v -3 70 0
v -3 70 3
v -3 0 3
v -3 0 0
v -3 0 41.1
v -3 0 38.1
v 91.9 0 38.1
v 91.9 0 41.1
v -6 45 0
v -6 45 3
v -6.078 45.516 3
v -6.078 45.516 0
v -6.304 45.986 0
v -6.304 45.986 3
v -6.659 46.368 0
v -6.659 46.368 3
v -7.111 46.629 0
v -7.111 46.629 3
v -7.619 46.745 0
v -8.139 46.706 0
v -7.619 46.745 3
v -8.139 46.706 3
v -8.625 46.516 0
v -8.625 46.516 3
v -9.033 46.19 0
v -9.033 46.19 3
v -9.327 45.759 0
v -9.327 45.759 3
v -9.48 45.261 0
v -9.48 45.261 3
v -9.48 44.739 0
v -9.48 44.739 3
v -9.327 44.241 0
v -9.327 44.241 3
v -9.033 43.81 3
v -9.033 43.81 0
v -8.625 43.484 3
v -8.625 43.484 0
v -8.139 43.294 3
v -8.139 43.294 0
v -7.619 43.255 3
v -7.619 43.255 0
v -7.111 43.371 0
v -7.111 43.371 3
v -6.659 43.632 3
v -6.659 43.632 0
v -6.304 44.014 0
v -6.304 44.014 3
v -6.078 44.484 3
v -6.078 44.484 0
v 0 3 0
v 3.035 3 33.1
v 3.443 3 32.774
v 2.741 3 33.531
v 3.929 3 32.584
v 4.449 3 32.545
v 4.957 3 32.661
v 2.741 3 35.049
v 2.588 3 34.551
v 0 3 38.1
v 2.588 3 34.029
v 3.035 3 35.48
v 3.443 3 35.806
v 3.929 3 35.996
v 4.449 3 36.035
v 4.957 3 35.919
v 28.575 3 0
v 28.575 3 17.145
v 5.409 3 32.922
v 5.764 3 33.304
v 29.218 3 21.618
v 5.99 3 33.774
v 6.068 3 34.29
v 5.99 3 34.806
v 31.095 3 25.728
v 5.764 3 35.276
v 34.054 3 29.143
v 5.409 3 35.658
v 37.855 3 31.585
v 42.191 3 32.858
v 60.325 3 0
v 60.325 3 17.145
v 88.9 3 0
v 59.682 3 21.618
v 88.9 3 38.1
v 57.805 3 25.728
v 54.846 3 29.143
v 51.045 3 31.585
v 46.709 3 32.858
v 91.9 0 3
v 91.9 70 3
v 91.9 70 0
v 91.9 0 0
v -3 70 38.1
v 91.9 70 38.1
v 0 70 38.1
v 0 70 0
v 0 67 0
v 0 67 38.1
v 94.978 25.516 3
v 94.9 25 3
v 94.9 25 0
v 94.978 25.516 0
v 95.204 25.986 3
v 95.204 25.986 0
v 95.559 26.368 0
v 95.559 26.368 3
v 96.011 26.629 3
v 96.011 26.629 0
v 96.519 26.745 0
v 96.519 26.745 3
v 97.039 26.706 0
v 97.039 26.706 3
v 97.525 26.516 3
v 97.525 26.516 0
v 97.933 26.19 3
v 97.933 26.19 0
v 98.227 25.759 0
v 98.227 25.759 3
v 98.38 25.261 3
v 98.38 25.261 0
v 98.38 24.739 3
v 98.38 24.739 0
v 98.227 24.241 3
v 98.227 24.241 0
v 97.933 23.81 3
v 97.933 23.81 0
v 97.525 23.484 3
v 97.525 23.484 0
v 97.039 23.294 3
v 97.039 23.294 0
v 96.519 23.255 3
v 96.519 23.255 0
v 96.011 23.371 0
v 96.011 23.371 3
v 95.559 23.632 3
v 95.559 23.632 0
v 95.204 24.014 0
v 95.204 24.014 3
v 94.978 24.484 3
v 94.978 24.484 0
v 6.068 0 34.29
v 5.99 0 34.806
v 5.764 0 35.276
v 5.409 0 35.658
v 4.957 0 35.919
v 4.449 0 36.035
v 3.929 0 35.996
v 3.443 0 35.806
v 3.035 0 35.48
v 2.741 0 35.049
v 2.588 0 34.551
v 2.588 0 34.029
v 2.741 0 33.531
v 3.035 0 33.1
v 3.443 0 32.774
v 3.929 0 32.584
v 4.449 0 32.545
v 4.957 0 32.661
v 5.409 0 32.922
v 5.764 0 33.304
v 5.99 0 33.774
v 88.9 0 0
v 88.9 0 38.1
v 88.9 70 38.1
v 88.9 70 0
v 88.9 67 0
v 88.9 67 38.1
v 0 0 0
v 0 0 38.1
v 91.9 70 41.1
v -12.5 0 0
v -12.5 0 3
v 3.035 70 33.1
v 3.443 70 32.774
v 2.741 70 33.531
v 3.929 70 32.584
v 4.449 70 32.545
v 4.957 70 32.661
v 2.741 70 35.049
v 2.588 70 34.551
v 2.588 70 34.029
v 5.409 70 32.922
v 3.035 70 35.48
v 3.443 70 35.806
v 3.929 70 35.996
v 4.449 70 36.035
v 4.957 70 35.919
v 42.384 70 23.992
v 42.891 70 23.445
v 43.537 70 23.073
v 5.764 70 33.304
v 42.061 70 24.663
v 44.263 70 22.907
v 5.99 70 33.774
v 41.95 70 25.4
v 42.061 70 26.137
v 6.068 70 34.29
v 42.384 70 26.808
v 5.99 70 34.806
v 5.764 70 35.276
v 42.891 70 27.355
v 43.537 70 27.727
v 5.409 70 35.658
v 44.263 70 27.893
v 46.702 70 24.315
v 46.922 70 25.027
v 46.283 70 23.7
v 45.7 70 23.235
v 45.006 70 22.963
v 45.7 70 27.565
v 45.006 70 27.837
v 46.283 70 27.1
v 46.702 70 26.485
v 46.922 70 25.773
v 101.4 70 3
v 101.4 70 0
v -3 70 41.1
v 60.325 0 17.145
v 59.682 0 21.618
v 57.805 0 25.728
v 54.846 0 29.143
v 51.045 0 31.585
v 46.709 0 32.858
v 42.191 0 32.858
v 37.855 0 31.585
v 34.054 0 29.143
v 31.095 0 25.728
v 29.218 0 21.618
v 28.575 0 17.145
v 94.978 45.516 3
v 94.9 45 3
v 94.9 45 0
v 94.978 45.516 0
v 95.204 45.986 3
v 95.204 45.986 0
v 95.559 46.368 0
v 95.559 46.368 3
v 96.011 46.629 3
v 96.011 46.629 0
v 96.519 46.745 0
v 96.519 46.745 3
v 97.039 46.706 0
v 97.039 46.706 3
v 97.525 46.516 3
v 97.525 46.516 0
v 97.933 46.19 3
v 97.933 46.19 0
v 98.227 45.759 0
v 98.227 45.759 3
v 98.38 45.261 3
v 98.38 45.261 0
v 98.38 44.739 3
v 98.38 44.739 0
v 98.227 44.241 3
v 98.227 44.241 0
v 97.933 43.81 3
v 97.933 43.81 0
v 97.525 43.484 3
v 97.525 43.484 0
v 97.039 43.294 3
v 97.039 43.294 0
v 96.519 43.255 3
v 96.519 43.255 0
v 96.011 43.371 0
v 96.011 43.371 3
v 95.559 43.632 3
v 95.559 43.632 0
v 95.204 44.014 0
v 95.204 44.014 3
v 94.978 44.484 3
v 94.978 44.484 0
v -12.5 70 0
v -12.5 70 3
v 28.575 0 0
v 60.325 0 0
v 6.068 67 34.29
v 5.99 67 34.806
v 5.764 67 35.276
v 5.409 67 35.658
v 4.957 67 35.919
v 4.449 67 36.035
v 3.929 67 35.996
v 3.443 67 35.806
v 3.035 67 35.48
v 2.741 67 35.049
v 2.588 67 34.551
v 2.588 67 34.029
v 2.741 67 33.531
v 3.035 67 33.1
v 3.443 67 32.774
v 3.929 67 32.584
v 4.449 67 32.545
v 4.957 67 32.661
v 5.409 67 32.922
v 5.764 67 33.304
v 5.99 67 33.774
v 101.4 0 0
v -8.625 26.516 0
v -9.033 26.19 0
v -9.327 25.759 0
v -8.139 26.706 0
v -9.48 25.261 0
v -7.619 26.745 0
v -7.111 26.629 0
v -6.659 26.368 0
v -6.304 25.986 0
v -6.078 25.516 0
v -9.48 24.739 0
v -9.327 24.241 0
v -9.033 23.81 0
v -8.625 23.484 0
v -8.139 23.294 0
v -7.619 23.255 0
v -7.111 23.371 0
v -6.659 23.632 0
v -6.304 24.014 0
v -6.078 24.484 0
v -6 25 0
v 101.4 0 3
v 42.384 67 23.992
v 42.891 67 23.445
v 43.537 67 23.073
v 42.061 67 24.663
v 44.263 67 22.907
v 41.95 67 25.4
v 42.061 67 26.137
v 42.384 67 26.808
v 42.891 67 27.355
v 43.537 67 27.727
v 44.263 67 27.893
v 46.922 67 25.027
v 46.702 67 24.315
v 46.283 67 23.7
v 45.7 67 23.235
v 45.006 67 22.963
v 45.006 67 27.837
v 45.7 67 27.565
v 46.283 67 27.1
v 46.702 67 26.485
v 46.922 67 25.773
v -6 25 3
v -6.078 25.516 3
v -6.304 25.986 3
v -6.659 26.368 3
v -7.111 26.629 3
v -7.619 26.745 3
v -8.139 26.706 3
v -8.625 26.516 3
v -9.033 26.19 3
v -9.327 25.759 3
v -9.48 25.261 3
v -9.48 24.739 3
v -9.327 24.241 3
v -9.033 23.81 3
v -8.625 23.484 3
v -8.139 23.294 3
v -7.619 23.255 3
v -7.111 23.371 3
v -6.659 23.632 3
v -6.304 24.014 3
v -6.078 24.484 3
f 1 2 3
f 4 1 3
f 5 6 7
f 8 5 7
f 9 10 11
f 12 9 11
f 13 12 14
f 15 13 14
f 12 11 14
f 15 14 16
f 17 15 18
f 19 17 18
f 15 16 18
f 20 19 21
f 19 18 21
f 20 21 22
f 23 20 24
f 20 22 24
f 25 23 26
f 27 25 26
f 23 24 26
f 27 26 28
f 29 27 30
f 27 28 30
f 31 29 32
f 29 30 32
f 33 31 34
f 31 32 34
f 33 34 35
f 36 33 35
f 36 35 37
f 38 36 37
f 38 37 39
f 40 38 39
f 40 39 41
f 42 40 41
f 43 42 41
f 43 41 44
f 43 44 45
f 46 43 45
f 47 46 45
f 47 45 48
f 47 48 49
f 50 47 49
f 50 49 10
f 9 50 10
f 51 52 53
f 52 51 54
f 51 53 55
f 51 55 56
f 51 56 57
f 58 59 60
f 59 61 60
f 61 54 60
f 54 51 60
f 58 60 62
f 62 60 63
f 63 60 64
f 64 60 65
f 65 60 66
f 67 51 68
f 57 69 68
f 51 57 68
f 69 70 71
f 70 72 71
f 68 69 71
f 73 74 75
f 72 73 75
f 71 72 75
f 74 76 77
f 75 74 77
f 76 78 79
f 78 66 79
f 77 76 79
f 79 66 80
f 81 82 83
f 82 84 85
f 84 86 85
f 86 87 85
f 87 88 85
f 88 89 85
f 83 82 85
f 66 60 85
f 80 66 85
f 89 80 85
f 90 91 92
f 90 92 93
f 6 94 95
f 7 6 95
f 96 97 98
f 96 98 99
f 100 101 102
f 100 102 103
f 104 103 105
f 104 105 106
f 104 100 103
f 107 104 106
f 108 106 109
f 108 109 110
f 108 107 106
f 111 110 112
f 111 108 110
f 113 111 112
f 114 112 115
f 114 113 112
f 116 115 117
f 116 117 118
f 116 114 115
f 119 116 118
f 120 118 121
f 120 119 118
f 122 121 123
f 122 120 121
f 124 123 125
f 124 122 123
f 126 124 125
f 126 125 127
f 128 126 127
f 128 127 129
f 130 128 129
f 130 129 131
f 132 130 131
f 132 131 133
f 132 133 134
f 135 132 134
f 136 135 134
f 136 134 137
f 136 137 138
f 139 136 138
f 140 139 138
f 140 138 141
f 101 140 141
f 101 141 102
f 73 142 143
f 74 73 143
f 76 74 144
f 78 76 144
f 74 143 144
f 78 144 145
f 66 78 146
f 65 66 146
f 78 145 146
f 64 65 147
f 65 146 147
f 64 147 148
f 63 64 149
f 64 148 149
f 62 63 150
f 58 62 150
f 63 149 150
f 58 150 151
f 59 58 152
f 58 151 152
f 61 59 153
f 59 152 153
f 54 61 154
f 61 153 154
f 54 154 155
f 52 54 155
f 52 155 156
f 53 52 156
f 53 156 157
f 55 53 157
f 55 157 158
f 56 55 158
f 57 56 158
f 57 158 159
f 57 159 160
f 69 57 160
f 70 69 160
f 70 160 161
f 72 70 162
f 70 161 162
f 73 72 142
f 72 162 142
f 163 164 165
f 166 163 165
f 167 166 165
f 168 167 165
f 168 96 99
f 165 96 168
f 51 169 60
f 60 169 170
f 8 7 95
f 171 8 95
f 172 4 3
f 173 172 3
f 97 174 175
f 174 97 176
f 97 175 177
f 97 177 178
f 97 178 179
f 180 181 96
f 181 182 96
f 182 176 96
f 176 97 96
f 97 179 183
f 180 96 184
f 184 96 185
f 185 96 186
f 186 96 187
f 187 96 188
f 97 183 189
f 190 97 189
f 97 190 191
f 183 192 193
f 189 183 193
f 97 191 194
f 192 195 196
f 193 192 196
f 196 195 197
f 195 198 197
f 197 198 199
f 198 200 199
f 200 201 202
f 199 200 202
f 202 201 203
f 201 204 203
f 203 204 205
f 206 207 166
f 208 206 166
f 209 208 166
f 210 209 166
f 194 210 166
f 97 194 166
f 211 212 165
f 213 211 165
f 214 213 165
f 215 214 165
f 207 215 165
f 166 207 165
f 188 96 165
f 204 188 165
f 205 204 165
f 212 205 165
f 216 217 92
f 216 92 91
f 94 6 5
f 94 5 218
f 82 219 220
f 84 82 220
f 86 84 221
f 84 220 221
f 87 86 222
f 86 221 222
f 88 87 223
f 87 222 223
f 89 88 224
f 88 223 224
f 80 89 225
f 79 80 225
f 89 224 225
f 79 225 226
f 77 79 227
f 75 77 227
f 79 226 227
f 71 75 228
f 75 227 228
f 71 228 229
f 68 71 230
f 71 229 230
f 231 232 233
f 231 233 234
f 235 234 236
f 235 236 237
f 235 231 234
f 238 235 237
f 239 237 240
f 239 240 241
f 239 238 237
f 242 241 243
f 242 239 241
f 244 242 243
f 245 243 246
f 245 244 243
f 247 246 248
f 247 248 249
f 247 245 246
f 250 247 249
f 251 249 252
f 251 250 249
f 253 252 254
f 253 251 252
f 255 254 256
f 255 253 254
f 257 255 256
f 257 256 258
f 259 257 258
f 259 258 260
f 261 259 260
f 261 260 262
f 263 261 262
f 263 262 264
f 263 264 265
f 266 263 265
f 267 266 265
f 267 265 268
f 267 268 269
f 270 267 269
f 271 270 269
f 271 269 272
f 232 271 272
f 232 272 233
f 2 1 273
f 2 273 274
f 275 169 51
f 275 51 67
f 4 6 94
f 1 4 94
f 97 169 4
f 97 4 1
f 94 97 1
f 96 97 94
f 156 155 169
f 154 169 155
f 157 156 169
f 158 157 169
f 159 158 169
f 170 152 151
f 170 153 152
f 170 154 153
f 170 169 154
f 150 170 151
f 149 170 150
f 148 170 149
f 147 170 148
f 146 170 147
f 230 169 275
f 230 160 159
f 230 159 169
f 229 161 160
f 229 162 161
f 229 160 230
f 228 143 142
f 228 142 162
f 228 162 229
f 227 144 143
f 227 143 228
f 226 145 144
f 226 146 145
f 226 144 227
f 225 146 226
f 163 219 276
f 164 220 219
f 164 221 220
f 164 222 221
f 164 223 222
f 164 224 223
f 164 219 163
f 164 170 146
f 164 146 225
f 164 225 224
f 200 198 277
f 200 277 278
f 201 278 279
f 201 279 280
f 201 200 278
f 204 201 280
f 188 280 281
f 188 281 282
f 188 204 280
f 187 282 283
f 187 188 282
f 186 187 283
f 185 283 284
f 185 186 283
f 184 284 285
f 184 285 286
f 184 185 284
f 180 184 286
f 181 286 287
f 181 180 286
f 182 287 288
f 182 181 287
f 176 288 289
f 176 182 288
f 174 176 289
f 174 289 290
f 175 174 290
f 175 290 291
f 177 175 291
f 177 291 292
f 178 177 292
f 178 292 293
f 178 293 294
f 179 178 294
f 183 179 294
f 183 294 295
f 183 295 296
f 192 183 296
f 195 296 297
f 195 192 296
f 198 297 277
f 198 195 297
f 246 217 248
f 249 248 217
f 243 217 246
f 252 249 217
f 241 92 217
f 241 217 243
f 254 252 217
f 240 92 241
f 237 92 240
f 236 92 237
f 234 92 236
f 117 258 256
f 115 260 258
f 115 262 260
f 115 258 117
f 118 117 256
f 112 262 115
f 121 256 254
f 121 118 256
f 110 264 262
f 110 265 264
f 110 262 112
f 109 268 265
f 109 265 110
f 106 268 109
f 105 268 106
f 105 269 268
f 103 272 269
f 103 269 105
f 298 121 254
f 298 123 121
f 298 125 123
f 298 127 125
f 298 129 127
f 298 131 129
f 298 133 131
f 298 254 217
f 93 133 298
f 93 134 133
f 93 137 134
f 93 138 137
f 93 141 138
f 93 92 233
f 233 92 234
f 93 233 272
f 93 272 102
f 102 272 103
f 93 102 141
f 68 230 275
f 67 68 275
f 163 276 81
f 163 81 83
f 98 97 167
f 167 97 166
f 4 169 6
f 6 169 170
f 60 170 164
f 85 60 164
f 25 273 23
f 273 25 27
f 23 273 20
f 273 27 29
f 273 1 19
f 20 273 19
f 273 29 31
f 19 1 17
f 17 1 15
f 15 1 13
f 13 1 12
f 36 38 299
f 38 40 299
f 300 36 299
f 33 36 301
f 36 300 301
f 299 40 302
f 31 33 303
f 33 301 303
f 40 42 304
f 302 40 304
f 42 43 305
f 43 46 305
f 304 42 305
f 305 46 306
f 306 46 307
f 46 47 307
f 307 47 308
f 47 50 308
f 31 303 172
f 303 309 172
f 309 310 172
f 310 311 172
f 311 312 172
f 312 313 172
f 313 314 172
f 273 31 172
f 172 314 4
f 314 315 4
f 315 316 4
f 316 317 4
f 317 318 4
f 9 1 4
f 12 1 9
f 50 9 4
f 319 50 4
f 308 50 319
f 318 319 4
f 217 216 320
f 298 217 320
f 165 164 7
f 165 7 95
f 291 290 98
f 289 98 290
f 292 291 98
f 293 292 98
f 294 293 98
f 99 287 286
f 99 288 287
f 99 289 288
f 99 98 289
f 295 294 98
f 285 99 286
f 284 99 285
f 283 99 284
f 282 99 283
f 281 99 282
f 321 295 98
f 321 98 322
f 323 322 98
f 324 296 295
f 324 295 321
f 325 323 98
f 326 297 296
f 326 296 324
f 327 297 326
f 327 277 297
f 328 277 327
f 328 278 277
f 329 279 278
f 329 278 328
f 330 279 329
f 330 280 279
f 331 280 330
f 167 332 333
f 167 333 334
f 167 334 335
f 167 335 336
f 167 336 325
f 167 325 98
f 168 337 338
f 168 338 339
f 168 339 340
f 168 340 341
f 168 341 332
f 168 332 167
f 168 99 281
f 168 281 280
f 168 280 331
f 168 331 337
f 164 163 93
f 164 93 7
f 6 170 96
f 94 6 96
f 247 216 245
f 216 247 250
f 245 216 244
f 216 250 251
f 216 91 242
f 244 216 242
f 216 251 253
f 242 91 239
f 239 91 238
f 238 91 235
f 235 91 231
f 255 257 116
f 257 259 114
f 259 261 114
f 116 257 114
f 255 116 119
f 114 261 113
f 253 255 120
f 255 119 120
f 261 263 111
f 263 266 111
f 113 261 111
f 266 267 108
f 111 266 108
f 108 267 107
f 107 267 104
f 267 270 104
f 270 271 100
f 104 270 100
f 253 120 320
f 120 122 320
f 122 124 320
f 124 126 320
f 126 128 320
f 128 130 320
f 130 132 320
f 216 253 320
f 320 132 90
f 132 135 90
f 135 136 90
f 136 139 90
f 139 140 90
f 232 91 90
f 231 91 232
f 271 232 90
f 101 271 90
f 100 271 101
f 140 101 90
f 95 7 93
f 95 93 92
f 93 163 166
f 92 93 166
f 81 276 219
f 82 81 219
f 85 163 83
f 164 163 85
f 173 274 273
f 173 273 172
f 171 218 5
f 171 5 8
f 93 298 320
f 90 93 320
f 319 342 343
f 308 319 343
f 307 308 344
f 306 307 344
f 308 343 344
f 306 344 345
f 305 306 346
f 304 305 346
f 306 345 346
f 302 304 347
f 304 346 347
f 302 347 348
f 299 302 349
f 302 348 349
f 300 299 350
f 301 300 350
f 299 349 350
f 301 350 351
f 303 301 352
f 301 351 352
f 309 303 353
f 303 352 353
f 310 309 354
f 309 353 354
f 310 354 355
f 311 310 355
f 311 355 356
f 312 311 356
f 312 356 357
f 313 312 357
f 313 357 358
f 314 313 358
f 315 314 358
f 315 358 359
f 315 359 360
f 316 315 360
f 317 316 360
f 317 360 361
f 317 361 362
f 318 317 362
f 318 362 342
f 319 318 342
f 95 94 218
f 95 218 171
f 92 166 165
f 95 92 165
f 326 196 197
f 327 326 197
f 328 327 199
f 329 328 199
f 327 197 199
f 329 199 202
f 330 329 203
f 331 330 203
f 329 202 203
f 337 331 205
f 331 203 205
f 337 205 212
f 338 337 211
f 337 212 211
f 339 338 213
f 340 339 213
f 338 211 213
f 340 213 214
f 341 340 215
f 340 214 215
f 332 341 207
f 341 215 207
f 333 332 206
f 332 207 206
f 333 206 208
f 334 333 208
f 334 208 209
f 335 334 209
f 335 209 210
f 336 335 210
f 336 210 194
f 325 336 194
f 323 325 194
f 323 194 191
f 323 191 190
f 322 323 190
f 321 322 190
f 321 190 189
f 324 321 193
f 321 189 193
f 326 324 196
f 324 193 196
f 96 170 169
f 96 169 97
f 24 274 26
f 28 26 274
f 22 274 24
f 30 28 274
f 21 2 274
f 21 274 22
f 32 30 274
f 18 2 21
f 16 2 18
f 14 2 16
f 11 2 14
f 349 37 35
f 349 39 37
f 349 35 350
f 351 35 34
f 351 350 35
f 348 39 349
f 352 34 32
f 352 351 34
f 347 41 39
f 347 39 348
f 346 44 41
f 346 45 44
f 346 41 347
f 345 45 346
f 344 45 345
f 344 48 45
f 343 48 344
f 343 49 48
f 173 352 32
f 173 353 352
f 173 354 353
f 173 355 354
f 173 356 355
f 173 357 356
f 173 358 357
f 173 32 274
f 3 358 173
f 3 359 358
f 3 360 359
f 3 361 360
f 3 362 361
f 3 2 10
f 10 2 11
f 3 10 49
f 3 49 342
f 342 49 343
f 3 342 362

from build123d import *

# Parameters (mm, degrees)
F3_W      = 88.9
F3_H      = 38.1
F4_DEPTH  = 3
F5_R      = 1.75
F6_DEPTH  = 3
F10_W     = 70
F10_H     = 38.1
F11_DEPTH = 3
F13_W     = 94.9
F13_H     = 70
F14_DEPTH = 3
F15_W     = 70
F15_H     = 3
F16_DEPTH = 9.5
F18_R     = 1.75
F19_DEPTH = 3.001
F22_DEPTH = 3
F23_R     = 2.5
F24_DEPTH = 3


with BuildPart() as f4:
    # F3 (on Front) → F4 (new body)
    with BuildSketch(Plane.XZ):
        with Locations((44.45, 19.05)):
            Rectangle(F3_W, F3_H)
    extrude(amount=-F4_DEPTH)

    # F5 (on face) → F6 (cut, through all)
    with BuildSketch(Plane.XZ):
        with Locations((4.318, 34.29)):
            Circle(F5_R)
    extrude(amount=-F6_DEPTH, mode=Mode.SUBTRACT)


with BuildPart() as f8_1:
    # F8: instance of F4
    add(f4.part.mirror(Plane.XZ.offset(-35)))

    # F23 (on face) → F24 (cut, through all)
    with BuildSketch(Plane(origin=(0, 70, 0), x_dir=(-1, 0, 0), z_dir=(0, 1, 0))):
        with Locations((-44.45, 25.4)):
            Circle(F23_R)
    extrude(amount=-F24_DEPTH, mode=Mode.SUBTRACT)


with BuildPart() as f11:
    # F10 (on plane+point) → F11 (new body)
    with BuildSketch(Plane.YZ):
        with Locations((35, 19.05)):
            Rectangle(F10_W, F10_H)
    extrude(amount=-F11_DEPTH)


with BuildPart() as f14:
    # F13 (on plane+point) → F14 (new body)
    with BuildSketch(Plane.XY.offset(38.1)):
        with Locations((44.45, 35)):
            Rectangle(F13_W, F13_H)
    extrude(amount=F14_DEPTH)


with BuildPart() as f16:
    # F15 (on face) → F16 (new body)
    with BuildSketch(Plane(origin=(-3, 0, 0), x_dir=(0, -1, 0), z_dir=(-1, 0, 0))):
        with Locations((-35, 1.5)):
            Rectangle(F15_W, F15_H)
    extrude(amount=F16_DEPTH)

    # F18 (on face) → F19 (cut, through all)
    with BuildSketch(Plane.XY.offset(3)):
        with Locations((-7.75, 45)):
            Circle(F18_R)
        with Locations((-7.75, 25)):
            Circle(F18_R)
    extrude(amount=-F19_DEPTH, mode=Mode.SUBTRACT)


with BuildPart() as f20_1:
    # F20: instance of F16
    add(f16.part.mirror(Plane(origin=(44.45, 0.75, 9.525), x_dir=(0, 1, 0), z_dir=(1, 0, 0))))


with BuildPart() as f20_2:
    # F20: instance of F11
    add(f11.part.mirror(Plane(origin=(44.45, 0.75, 9.525), x_dir=(0, 1, 0), z_dir=(1, 0, 0))))


with BuildPart() as f4_1:
    add(f4.part)

    # F21 (on face) → F22 (cut, through all)
    with BuildSketch(Plane.XZ):
        with BuildLine():
            Line((60.325, 0), (60.325, 17.145))
            ThreePointArc((60.325, 17.145), (44.45, 33.02), (28.575, 17.145))
            Line((28.575, 17.145), (28.575, 0))
            Line((28.575, 0), (60.325, 0))
        make_face()
    extrude(amount=-F22_DEPTH, mode=Mode.SUBTRACT)


solid = Compound([f8_1.part, f11.part, f14.part, f16.part, f20_1.part, f20_2.part, f4_1.part])
